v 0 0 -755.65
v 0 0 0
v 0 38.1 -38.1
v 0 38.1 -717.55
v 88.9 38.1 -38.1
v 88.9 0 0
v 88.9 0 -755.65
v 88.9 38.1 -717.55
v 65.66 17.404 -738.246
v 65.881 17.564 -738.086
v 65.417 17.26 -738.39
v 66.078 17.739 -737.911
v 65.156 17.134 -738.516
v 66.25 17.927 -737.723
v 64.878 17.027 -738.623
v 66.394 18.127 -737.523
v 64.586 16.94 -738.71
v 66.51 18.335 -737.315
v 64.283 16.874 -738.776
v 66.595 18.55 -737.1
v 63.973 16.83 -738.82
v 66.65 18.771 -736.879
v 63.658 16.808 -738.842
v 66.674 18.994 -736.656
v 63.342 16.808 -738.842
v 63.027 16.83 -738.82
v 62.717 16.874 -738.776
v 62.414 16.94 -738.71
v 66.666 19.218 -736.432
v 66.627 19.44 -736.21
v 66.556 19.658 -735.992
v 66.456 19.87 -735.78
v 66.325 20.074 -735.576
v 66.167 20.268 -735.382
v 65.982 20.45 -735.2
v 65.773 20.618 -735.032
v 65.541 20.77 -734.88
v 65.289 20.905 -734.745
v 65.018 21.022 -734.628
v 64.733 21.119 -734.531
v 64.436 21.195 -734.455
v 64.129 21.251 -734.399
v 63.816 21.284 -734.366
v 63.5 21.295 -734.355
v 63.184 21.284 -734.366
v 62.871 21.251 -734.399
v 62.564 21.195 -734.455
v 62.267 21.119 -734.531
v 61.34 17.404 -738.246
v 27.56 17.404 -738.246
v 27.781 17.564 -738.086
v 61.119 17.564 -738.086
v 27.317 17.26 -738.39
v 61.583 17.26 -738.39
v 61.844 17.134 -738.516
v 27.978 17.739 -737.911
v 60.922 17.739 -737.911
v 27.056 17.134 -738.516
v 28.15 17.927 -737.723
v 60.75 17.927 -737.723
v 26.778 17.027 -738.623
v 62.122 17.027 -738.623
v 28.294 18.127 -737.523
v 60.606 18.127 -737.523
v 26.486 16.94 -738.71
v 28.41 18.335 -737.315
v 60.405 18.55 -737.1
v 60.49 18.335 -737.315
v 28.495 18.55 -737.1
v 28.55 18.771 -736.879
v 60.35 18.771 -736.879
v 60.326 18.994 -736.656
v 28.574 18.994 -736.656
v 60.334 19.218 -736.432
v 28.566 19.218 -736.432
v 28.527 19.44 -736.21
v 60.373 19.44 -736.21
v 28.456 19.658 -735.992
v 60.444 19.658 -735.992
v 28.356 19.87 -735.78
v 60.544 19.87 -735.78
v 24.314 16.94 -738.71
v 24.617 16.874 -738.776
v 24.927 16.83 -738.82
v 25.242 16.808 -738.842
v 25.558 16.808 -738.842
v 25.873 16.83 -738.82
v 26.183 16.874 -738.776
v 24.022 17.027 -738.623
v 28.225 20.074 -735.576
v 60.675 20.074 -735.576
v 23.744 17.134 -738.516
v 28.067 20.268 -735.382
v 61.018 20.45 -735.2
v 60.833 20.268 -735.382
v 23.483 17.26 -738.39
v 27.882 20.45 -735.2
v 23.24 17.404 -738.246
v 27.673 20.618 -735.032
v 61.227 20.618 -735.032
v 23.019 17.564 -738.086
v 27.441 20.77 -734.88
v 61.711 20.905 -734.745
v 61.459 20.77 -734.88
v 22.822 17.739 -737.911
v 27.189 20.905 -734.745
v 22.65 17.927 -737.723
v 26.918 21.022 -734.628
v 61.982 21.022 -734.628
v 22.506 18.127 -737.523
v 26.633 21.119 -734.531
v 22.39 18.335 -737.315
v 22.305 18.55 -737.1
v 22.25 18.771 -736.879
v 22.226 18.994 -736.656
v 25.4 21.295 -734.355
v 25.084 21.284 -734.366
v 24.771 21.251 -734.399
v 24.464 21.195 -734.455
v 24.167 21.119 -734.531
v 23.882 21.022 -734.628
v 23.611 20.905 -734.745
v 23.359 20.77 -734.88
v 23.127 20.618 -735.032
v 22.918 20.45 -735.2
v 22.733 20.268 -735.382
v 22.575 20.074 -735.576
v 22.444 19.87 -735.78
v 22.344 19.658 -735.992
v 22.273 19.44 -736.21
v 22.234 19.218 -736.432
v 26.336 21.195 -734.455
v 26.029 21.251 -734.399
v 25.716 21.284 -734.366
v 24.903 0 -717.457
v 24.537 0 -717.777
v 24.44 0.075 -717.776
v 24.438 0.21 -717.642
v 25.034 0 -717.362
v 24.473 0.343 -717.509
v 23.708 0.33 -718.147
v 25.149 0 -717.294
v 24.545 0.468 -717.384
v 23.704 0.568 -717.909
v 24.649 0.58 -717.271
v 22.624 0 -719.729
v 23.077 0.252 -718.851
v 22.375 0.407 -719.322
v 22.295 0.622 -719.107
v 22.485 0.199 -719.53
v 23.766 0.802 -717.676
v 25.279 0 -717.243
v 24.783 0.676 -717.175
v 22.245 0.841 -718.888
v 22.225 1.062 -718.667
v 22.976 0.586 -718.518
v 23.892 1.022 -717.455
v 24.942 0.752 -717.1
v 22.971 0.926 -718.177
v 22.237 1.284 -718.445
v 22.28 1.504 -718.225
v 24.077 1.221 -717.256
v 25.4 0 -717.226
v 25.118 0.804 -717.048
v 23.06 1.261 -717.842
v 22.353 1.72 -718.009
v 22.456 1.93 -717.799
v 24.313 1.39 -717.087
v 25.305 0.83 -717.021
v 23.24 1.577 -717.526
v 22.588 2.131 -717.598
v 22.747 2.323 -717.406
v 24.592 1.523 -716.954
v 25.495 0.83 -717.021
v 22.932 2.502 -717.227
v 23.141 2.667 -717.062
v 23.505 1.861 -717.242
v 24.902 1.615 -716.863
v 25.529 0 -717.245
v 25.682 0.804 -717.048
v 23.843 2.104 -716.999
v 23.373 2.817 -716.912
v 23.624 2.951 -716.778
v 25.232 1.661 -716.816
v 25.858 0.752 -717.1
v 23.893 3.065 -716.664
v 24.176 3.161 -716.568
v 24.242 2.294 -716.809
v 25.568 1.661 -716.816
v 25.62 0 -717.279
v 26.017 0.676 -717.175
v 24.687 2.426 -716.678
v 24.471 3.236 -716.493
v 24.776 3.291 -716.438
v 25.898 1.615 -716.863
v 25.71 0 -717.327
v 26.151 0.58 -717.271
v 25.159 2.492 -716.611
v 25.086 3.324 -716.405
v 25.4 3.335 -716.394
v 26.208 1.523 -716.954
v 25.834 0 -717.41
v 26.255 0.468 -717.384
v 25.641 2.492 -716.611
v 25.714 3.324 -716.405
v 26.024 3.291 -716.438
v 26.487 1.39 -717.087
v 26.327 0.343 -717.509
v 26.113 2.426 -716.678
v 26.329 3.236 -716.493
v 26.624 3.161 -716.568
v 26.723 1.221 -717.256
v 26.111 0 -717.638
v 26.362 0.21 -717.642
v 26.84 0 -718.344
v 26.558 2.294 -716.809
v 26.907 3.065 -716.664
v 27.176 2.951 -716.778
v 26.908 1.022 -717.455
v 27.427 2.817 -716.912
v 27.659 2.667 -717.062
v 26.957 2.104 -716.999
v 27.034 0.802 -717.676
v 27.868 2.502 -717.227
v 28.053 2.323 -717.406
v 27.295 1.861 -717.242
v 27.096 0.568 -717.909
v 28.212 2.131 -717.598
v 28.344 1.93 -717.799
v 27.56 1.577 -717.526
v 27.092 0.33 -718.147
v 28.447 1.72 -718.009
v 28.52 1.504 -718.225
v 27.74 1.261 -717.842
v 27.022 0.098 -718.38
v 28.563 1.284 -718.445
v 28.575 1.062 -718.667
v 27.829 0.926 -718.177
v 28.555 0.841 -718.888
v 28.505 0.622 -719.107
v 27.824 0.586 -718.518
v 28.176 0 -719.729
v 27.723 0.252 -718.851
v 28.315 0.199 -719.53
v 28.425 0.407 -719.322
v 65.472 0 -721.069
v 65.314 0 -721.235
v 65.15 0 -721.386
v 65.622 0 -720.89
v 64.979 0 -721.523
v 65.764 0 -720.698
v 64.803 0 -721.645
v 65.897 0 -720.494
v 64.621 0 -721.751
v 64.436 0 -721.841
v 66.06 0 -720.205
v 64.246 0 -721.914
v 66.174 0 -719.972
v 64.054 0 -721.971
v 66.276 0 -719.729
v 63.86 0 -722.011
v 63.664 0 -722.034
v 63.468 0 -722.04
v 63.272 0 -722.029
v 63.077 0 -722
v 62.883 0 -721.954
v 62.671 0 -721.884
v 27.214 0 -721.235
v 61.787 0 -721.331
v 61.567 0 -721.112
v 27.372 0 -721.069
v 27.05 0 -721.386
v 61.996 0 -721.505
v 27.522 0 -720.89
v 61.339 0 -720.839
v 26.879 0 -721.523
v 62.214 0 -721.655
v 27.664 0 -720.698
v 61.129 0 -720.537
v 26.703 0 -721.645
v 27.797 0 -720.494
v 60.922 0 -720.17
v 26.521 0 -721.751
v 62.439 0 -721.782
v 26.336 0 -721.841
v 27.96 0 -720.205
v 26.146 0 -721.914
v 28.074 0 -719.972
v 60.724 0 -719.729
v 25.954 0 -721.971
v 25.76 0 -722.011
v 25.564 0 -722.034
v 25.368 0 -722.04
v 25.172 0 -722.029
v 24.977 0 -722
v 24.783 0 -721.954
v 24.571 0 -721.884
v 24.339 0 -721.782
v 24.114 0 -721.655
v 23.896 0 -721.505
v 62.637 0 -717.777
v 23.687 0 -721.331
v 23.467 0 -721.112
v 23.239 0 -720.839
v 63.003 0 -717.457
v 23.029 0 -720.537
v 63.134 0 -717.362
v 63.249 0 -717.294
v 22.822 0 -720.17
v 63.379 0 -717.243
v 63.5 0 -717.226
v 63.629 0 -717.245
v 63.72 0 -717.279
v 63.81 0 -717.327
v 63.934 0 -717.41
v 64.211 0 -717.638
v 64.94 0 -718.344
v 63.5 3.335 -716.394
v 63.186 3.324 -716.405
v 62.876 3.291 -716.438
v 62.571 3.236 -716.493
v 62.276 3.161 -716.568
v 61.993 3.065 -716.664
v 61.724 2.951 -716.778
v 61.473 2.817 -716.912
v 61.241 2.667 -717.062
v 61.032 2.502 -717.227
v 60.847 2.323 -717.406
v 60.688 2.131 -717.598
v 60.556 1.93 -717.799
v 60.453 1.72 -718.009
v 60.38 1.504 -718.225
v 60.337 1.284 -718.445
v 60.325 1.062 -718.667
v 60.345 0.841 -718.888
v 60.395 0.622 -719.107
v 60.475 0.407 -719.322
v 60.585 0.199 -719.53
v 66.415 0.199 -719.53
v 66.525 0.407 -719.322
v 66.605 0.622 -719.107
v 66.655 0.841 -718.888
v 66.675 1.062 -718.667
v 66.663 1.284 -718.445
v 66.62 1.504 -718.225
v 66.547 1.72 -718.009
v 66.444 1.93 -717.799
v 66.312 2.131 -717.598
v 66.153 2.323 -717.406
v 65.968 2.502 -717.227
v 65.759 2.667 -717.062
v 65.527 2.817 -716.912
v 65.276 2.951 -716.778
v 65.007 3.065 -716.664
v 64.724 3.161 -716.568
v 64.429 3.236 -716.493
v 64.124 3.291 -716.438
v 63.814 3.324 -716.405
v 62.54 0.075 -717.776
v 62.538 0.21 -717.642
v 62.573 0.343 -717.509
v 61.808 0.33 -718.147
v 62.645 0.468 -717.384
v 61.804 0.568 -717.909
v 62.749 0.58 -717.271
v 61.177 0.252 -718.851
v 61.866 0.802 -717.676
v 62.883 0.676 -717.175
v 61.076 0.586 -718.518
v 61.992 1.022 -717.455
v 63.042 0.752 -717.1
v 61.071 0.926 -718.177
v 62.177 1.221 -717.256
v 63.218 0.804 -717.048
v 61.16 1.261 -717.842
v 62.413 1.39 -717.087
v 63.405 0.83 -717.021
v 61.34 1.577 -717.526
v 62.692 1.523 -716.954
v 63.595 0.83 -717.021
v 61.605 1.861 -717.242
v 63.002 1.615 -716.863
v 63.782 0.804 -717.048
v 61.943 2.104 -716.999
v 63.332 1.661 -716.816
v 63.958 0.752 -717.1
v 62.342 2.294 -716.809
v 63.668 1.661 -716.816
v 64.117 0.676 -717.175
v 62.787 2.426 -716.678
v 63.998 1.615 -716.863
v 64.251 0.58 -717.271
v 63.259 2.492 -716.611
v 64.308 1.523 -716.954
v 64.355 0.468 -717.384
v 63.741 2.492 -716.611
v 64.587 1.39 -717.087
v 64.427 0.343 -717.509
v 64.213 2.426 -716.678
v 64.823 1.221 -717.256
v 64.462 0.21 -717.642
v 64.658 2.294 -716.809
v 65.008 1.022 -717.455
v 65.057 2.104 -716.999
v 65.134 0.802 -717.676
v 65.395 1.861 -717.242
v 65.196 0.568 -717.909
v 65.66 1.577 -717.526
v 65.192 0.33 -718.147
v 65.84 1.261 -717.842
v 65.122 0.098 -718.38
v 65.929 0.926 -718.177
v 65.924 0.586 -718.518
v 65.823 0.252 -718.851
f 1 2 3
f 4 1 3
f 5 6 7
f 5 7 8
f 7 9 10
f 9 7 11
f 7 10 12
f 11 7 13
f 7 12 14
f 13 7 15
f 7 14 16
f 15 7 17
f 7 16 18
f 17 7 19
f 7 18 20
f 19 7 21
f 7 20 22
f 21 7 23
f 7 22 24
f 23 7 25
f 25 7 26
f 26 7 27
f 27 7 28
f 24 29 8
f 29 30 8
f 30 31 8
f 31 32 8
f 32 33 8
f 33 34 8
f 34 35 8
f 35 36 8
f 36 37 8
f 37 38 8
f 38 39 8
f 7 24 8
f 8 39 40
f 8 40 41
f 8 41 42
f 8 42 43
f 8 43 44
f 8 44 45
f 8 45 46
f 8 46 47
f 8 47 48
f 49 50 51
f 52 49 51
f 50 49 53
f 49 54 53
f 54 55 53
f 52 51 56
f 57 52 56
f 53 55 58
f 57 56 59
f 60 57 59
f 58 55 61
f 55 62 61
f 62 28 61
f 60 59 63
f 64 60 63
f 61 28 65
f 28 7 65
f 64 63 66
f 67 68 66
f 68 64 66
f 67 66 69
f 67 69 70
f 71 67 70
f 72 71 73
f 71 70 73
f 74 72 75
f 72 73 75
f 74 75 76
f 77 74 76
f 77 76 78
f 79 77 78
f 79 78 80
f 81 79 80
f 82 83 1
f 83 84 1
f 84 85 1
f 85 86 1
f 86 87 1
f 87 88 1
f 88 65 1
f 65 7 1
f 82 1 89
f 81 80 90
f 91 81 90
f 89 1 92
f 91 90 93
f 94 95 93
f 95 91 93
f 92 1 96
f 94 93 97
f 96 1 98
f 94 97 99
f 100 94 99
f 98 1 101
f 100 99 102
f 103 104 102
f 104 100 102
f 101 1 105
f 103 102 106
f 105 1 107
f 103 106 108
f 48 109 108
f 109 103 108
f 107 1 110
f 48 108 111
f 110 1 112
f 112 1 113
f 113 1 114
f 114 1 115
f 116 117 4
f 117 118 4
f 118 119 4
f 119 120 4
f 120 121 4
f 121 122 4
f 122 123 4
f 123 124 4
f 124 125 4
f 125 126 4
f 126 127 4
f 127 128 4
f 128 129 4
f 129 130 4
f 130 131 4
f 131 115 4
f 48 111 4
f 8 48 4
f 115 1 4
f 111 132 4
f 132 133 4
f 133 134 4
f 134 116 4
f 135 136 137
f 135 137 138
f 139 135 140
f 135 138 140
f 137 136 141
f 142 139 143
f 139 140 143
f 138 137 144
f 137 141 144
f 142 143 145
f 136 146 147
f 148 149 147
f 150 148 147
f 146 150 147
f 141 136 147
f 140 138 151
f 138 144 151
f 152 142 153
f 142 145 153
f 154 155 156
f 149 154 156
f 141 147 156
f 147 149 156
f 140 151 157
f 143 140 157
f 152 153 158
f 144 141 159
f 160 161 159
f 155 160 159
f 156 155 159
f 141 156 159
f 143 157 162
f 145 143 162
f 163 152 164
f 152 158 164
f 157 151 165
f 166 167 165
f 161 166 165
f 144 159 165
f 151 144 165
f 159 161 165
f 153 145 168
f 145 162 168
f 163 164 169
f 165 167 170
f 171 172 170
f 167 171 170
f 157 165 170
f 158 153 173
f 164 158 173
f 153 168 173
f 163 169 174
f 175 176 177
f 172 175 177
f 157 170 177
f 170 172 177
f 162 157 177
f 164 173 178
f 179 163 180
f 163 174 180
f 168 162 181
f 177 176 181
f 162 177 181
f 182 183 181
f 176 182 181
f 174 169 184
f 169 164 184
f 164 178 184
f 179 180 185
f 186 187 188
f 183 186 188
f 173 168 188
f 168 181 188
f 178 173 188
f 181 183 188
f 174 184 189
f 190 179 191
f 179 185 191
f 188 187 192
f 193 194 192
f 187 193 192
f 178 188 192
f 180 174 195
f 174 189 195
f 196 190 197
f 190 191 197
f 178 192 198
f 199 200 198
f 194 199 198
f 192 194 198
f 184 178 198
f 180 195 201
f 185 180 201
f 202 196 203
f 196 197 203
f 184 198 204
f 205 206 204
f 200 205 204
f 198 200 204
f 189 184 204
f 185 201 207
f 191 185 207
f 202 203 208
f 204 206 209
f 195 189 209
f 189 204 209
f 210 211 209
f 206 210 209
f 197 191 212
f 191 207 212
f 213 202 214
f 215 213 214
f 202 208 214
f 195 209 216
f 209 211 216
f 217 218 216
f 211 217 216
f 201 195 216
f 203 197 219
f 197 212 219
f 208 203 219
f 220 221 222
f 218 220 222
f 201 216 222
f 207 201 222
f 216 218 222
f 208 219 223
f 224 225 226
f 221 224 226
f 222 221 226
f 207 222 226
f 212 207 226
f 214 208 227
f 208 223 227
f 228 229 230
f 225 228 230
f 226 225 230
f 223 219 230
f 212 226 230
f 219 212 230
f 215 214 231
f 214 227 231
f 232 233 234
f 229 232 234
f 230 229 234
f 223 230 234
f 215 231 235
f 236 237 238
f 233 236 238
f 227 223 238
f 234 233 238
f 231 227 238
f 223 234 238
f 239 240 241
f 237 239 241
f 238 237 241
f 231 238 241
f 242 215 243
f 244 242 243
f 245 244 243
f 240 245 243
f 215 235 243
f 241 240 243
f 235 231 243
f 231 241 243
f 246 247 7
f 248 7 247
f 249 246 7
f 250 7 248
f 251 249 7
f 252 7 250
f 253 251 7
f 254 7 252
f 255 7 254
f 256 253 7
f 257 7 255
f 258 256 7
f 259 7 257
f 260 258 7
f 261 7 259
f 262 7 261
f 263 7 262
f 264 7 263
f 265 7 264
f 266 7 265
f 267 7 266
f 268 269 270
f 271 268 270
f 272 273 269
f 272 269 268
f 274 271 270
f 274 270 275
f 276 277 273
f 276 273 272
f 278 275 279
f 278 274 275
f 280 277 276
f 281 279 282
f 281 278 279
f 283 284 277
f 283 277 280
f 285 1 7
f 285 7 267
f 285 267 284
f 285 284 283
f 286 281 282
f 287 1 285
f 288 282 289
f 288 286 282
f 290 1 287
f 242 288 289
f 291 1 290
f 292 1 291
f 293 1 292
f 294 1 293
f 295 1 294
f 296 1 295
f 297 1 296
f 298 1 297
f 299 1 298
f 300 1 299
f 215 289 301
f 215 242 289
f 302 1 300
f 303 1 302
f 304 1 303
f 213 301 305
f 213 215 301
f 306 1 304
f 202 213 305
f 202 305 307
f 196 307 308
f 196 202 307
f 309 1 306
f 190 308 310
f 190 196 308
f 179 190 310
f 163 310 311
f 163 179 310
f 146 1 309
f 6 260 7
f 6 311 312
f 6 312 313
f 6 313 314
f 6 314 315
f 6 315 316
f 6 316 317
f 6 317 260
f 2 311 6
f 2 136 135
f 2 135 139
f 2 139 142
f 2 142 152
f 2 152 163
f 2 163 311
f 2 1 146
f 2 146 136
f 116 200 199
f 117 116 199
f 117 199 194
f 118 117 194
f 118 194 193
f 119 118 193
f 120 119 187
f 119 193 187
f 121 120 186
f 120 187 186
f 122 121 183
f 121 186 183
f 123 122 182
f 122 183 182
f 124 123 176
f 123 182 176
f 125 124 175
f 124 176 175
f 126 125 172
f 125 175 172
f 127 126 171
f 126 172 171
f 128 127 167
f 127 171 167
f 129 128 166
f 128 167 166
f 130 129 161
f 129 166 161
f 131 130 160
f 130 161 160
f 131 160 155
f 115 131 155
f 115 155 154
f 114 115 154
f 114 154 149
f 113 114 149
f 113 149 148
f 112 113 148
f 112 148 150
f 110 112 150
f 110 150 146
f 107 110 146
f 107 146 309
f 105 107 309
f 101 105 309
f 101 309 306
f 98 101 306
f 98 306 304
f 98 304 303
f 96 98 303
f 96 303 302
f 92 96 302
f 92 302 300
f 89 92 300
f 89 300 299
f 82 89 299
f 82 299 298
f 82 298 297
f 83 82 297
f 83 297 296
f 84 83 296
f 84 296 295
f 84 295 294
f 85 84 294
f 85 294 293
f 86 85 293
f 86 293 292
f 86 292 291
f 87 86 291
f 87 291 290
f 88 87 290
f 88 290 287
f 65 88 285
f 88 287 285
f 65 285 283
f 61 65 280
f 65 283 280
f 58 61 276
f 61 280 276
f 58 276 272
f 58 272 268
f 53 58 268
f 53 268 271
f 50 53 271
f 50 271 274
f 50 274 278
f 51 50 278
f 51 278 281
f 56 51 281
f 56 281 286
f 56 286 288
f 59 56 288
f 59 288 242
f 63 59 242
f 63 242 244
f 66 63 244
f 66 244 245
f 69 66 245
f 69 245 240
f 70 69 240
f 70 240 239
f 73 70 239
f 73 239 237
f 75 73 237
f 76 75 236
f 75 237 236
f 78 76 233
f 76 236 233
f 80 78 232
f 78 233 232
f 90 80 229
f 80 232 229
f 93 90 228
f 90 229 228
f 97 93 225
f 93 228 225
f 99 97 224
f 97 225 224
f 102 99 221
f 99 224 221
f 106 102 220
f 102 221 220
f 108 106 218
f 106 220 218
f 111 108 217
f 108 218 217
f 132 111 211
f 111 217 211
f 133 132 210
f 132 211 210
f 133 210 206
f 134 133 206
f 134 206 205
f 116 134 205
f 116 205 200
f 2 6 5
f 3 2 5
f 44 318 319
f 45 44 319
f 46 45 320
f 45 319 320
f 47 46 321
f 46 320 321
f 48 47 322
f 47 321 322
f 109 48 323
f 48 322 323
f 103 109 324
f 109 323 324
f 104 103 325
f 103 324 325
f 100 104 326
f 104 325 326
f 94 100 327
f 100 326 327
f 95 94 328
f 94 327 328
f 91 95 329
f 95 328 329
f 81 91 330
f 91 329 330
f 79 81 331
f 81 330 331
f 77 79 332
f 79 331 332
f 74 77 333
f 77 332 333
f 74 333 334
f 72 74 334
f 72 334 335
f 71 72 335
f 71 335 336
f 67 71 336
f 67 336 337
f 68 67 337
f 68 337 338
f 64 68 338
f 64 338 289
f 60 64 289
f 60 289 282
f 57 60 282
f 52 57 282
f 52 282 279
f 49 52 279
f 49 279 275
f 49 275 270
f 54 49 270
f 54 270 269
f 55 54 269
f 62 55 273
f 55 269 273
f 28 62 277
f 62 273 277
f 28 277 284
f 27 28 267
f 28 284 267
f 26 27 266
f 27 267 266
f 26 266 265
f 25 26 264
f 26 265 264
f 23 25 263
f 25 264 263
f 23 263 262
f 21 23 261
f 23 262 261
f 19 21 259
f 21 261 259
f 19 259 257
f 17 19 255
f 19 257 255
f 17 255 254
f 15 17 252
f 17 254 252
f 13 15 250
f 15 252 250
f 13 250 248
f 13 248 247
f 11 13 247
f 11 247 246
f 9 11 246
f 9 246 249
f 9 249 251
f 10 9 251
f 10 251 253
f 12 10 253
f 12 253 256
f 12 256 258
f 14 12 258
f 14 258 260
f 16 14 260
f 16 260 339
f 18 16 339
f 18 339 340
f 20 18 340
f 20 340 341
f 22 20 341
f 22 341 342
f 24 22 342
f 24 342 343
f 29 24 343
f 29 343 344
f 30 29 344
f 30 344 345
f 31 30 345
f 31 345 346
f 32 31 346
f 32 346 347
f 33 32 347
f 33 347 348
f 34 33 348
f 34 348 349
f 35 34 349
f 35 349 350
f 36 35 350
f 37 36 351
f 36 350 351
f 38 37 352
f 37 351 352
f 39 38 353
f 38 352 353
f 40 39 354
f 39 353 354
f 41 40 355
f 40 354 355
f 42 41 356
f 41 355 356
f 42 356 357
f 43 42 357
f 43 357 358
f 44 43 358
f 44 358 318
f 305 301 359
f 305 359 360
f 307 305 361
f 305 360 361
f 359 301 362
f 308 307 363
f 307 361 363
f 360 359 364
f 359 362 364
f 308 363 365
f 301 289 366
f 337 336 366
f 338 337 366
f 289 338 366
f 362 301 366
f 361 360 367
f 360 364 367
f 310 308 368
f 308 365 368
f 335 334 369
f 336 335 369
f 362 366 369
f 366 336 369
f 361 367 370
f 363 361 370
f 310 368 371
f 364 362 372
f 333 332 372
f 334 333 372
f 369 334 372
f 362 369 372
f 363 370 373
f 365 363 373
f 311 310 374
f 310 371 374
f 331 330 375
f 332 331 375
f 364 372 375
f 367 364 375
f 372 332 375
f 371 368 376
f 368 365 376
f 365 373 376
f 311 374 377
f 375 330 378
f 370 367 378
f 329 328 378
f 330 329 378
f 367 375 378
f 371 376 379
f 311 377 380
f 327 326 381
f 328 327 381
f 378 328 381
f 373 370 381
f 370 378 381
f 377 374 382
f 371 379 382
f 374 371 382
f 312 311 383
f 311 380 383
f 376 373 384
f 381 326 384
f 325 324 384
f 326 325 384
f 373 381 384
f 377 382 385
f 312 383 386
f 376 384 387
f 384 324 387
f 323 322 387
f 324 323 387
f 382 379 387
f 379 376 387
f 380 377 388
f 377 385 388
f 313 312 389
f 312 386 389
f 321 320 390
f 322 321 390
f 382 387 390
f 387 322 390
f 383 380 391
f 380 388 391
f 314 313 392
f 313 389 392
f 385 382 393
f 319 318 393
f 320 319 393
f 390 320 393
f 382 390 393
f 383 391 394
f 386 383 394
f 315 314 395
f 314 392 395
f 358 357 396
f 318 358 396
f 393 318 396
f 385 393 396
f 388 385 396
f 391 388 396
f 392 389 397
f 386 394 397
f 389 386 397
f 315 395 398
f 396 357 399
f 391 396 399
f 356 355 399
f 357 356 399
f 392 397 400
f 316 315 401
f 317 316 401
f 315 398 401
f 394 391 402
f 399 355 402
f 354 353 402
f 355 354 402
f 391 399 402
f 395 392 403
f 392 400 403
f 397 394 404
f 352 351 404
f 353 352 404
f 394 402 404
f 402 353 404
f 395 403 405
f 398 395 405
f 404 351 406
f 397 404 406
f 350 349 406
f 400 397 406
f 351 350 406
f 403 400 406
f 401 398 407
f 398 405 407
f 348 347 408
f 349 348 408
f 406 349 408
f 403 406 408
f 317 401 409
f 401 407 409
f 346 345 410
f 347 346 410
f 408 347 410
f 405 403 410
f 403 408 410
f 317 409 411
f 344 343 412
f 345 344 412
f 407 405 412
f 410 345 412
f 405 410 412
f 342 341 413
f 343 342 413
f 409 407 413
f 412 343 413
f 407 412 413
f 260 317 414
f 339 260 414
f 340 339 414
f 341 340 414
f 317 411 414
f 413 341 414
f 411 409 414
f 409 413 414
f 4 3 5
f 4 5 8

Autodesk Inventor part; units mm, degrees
ref_plane "YZ Plane" through (0, 0, 0) normal (1, 0, 0) x (0, 1, 0)
ref_plane "XZ Plane" through (0, 0, 0) normal (0, 1, 0) x (-1, 0, 0)
ref_plane "XY Plane" through (0, 0, 0) normal (0, 0, 1) x (1, 0, 0)
sketch "Sketch1" plane through (0, 0, 0) normal (1, 0, 0) x (0, 1, 0)
  line L0 (38.1, -38.1) -> (38.1, -717.55)
  line L1 (0, -755.65) -> (0, 0)
  line L2 (0, 0) -> (38.1, -38.1)
  line L3 (0, 0) -> (78.5772, 0) construction
  line L4 (0, -755.65) -> (38.1, -717.55)
  dimension "d2" = 45
  dimension "d20" = 755.65
extrude "Extrusion1" add sketch "Sketch1" along normal blind 88.9
sketch "Sketch2" plane through (88.9, 38.1, -717.55) normal (0, 0.7071, -0.7071) x (-1, 0, 0)
  line L0 (0, -53.8815) -> (0, 0) projected
  line L1 (88.9, -53.8815) -> (0, -53.8815) projected
  circle A0 centre (25.4, -26.9408) radius 4.5233
  circle A1 centre (63.5, -26.9408) radius 4.5233
  point P0 (88.9, 480.4437)
  dimension "d5" = 25.4
  dimension "d8" = 38.1
hole "Hole1" at (63.5, 19.05, -736.6) at (25.4, 19.05, -736.6) direction (0, -0.7071, 0.7071) diameter 6.35 depth 25.4 tip angle 118
properties part number "2p2ps45" material "Wood (Cherry)"
